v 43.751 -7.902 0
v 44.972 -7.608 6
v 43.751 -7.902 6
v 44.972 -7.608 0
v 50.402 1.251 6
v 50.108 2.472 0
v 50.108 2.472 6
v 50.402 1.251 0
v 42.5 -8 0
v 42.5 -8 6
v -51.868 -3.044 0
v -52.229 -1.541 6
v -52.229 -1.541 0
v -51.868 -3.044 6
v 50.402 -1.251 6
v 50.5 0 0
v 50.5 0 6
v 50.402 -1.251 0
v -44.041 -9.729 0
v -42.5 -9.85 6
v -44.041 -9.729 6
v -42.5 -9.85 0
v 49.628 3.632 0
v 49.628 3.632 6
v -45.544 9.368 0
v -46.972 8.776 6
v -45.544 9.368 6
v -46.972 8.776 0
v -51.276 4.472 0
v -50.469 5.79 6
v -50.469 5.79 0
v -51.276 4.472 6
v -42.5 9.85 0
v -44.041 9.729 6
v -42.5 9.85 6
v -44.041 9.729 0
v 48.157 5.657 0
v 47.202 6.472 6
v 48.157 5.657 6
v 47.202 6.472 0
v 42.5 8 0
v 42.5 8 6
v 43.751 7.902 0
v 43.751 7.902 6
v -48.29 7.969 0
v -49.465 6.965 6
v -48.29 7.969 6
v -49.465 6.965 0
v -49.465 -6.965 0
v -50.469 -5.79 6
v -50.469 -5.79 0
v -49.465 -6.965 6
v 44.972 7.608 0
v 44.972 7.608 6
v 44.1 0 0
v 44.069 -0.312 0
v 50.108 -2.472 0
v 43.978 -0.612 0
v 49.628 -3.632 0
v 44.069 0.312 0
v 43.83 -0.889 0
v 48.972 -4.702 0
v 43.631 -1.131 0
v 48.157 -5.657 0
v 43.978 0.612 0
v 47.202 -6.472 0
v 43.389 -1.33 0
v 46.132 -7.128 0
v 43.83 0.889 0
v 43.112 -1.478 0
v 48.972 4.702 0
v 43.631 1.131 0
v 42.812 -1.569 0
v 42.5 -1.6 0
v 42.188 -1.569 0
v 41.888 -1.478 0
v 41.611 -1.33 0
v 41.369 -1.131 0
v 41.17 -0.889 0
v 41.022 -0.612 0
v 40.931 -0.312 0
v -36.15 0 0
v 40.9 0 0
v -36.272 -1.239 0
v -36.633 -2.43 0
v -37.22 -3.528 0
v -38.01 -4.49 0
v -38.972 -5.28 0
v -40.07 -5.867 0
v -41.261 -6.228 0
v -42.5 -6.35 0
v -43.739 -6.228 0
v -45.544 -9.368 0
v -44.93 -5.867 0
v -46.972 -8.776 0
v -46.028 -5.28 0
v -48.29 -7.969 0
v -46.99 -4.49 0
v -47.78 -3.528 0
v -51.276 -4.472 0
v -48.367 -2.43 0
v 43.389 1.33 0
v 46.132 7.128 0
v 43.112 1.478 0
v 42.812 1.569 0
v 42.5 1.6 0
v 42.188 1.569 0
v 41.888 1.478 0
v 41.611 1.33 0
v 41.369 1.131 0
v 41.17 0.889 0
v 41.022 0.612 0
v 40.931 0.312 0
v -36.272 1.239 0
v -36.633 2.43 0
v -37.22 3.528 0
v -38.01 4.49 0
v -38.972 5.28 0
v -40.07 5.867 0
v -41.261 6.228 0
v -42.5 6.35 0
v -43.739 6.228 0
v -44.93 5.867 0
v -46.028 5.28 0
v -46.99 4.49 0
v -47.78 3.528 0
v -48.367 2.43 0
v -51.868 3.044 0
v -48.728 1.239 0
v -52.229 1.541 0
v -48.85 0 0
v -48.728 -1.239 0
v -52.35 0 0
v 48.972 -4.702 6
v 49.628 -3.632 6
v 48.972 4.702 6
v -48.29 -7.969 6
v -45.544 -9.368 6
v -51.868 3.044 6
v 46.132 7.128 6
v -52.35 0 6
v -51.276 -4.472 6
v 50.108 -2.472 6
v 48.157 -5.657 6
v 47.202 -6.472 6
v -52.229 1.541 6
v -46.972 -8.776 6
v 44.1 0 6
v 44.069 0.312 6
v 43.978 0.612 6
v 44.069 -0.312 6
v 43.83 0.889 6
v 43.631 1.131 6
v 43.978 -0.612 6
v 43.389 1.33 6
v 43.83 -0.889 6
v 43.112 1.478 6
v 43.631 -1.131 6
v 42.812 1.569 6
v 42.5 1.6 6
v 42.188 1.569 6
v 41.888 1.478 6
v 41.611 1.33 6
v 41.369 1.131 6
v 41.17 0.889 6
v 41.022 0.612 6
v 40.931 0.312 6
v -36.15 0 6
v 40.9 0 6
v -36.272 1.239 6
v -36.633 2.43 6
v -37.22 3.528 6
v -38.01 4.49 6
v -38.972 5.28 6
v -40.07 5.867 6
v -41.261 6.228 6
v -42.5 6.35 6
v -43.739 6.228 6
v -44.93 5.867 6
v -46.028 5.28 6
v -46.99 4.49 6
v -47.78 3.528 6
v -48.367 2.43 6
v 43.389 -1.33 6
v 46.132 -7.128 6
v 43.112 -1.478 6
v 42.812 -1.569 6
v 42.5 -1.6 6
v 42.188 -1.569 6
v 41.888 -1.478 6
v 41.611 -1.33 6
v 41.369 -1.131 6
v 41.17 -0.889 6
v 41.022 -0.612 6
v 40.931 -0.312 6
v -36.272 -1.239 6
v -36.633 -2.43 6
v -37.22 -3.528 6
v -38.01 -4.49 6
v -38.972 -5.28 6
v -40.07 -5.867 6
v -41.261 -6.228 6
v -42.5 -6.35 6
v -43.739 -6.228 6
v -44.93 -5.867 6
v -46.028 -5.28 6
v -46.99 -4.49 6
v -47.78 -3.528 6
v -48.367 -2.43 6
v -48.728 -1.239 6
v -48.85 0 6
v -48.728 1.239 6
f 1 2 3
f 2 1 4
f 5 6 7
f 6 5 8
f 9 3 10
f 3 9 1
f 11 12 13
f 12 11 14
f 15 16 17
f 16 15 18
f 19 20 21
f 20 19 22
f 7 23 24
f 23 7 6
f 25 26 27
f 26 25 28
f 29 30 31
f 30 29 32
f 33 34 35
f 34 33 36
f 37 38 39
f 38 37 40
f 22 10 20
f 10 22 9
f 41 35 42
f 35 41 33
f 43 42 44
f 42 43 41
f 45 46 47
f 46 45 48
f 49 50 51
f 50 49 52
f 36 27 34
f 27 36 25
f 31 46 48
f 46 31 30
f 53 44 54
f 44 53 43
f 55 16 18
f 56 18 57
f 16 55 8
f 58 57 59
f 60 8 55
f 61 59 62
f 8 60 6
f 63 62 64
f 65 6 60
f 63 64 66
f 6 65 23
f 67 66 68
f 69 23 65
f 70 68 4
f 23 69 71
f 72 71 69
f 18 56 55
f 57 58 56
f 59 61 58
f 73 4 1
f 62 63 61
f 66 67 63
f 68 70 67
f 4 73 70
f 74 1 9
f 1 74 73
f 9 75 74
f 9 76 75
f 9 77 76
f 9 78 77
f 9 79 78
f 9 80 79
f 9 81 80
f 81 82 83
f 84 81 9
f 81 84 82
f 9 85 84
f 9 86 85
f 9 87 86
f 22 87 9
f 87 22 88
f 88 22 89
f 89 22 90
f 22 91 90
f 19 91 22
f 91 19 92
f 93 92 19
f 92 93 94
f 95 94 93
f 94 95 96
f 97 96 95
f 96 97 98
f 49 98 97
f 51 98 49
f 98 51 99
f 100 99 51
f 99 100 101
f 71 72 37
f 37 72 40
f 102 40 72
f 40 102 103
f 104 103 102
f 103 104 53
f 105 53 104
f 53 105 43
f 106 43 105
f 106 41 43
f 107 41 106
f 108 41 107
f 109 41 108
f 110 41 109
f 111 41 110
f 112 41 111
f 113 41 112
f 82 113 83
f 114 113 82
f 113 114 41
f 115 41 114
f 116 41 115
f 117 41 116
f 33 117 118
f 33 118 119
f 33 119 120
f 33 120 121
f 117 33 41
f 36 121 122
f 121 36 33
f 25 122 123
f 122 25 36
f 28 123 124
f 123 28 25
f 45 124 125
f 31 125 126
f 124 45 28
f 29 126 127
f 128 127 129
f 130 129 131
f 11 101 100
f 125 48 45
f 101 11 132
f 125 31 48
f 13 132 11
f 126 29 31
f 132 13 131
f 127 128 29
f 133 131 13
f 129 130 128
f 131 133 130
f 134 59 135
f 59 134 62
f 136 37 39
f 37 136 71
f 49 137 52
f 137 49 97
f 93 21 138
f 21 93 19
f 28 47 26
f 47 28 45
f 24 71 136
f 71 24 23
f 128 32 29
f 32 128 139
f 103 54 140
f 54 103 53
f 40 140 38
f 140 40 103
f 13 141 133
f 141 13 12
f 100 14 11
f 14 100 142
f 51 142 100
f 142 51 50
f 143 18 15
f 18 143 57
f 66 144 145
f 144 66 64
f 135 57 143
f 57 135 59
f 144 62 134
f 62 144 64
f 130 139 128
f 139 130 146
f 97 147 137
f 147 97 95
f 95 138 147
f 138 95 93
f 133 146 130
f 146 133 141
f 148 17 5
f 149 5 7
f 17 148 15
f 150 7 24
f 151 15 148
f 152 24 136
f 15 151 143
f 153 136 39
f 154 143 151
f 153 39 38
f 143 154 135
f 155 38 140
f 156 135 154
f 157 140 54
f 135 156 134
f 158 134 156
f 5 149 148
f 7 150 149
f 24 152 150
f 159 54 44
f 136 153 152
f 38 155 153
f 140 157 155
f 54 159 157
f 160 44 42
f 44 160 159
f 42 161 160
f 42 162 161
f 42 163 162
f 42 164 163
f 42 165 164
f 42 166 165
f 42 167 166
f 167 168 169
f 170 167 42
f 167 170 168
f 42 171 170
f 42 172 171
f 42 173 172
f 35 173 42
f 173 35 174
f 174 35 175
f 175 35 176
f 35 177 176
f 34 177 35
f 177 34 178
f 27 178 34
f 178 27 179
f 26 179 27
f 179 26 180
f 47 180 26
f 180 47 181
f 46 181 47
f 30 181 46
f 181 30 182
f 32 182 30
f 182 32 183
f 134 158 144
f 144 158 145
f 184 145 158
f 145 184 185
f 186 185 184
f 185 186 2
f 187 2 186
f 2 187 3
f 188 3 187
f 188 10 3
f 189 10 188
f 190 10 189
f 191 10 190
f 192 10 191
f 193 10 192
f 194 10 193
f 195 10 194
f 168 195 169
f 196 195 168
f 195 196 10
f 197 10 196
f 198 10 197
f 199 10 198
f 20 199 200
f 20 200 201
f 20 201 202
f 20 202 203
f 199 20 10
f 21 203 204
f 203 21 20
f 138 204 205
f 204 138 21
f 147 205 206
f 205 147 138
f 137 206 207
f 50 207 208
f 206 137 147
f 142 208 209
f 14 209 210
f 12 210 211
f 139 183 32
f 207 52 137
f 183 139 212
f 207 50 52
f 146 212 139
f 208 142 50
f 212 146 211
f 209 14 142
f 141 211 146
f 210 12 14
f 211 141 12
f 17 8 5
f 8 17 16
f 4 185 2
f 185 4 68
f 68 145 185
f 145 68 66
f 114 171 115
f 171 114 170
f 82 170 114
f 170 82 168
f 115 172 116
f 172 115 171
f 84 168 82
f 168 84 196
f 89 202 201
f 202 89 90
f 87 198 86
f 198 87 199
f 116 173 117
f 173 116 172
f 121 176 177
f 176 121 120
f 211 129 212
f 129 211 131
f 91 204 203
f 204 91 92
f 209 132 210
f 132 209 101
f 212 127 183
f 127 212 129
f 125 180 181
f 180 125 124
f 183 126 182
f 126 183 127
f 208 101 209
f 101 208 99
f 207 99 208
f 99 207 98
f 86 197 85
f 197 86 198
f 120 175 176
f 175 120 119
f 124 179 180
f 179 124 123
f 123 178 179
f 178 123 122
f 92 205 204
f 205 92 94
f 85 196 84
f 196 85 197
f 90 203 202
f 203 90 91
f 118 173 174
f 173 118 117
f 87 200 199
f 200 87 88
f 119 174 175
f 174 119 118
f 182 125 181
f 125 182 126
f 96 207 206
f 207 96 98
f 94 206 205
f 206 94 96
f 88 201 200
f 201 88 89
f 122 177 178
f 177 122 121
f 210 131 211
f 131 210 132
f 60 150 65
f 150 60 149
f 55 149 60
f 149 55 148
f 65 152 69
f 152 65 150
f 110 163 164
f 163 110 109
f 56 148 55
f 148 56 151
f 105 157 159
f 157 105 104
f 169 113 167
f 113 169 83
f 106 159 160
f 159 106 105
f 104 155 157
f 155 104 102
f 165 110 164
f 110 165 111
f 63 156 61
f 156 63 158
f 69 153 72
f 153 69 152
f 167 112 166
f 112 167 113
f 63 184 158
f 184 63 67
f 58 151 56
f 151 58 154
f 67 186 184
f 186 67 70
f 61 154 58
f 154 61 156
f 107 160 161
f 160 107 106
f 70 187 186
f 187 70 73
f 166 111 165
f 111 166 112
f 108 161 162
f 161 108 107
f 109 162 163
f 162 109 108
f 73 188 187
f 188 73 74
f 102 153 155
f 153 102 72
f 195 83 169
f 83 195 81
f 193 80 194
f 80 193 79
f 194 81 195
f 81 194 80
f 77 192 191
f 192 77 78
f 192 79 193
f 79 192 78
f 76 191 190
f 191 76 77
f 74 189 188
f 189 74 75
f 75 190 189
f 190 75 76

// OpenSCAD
$fn = 32;

// ----------------------------------------------------------------------
// Lever: 85 mm between the bosses, 6 mm thick, smooth outline
// ----------------------------------------------------------------------

// --- parameters (mm) ---
lever_l = 85;             // distance between the boss centres
boss_a = 19.7;            // first boss diameter
boss_b = 16;              // second boss diameter
bore_a = 12.7;            // first bore
bore_b = 3.2;             // second bore
lever_t = 6;              // lever thickness

lever_profile = [[-52.35, 0], [-52.229, -1.541], [-51.868, -3.044], [-51.276, -4.472], [-50.469, -5.79], [-49.465, -6.965], [-48.29, -7.969], [-46.972, -8.776], [-45.544, -9.368], [-44.041, -9.729], [-42.5, -9.85], [42.5, -8], [43.751, -7.902], [44.972, -7.608], [46.132, -7.128], [47.202, -6.472], [48.157, -5.657], [48.972, -4.702], [49.628, -3.632], [50.108, -2.472], [50.402, -1.251], [50.5, 0], [50.402, 1.251], [50.108, 2.472], [49.628, 3.632], [48.972, 4.702], [48.157, 5.657], [47.202, 6.472], [46.132, 7.128], [44.972, 7.608], [43.751, 7.902], [42.5, 8], [-42.5, 9.85], [-44.041, 9.729], [-45.544, 9.368], [-46.972, 8.776], [-48.29, 7.969], [-49.465, 6.965], [-50.469, 5.79], [-51.276, 4.472], [-51.868, 3.044], [-52.229, 1.541]];

difference() {
  linear_extrude(height = lever_t) polygon(lever_profile);
  translate([-42.5, 0, -2.5]) cylinder(h = lever_t + 5, d = bore_a);
  translate([42.5, 0, -2.5]) cylinder(h = lever_t + 5, d = bore_b);
}
